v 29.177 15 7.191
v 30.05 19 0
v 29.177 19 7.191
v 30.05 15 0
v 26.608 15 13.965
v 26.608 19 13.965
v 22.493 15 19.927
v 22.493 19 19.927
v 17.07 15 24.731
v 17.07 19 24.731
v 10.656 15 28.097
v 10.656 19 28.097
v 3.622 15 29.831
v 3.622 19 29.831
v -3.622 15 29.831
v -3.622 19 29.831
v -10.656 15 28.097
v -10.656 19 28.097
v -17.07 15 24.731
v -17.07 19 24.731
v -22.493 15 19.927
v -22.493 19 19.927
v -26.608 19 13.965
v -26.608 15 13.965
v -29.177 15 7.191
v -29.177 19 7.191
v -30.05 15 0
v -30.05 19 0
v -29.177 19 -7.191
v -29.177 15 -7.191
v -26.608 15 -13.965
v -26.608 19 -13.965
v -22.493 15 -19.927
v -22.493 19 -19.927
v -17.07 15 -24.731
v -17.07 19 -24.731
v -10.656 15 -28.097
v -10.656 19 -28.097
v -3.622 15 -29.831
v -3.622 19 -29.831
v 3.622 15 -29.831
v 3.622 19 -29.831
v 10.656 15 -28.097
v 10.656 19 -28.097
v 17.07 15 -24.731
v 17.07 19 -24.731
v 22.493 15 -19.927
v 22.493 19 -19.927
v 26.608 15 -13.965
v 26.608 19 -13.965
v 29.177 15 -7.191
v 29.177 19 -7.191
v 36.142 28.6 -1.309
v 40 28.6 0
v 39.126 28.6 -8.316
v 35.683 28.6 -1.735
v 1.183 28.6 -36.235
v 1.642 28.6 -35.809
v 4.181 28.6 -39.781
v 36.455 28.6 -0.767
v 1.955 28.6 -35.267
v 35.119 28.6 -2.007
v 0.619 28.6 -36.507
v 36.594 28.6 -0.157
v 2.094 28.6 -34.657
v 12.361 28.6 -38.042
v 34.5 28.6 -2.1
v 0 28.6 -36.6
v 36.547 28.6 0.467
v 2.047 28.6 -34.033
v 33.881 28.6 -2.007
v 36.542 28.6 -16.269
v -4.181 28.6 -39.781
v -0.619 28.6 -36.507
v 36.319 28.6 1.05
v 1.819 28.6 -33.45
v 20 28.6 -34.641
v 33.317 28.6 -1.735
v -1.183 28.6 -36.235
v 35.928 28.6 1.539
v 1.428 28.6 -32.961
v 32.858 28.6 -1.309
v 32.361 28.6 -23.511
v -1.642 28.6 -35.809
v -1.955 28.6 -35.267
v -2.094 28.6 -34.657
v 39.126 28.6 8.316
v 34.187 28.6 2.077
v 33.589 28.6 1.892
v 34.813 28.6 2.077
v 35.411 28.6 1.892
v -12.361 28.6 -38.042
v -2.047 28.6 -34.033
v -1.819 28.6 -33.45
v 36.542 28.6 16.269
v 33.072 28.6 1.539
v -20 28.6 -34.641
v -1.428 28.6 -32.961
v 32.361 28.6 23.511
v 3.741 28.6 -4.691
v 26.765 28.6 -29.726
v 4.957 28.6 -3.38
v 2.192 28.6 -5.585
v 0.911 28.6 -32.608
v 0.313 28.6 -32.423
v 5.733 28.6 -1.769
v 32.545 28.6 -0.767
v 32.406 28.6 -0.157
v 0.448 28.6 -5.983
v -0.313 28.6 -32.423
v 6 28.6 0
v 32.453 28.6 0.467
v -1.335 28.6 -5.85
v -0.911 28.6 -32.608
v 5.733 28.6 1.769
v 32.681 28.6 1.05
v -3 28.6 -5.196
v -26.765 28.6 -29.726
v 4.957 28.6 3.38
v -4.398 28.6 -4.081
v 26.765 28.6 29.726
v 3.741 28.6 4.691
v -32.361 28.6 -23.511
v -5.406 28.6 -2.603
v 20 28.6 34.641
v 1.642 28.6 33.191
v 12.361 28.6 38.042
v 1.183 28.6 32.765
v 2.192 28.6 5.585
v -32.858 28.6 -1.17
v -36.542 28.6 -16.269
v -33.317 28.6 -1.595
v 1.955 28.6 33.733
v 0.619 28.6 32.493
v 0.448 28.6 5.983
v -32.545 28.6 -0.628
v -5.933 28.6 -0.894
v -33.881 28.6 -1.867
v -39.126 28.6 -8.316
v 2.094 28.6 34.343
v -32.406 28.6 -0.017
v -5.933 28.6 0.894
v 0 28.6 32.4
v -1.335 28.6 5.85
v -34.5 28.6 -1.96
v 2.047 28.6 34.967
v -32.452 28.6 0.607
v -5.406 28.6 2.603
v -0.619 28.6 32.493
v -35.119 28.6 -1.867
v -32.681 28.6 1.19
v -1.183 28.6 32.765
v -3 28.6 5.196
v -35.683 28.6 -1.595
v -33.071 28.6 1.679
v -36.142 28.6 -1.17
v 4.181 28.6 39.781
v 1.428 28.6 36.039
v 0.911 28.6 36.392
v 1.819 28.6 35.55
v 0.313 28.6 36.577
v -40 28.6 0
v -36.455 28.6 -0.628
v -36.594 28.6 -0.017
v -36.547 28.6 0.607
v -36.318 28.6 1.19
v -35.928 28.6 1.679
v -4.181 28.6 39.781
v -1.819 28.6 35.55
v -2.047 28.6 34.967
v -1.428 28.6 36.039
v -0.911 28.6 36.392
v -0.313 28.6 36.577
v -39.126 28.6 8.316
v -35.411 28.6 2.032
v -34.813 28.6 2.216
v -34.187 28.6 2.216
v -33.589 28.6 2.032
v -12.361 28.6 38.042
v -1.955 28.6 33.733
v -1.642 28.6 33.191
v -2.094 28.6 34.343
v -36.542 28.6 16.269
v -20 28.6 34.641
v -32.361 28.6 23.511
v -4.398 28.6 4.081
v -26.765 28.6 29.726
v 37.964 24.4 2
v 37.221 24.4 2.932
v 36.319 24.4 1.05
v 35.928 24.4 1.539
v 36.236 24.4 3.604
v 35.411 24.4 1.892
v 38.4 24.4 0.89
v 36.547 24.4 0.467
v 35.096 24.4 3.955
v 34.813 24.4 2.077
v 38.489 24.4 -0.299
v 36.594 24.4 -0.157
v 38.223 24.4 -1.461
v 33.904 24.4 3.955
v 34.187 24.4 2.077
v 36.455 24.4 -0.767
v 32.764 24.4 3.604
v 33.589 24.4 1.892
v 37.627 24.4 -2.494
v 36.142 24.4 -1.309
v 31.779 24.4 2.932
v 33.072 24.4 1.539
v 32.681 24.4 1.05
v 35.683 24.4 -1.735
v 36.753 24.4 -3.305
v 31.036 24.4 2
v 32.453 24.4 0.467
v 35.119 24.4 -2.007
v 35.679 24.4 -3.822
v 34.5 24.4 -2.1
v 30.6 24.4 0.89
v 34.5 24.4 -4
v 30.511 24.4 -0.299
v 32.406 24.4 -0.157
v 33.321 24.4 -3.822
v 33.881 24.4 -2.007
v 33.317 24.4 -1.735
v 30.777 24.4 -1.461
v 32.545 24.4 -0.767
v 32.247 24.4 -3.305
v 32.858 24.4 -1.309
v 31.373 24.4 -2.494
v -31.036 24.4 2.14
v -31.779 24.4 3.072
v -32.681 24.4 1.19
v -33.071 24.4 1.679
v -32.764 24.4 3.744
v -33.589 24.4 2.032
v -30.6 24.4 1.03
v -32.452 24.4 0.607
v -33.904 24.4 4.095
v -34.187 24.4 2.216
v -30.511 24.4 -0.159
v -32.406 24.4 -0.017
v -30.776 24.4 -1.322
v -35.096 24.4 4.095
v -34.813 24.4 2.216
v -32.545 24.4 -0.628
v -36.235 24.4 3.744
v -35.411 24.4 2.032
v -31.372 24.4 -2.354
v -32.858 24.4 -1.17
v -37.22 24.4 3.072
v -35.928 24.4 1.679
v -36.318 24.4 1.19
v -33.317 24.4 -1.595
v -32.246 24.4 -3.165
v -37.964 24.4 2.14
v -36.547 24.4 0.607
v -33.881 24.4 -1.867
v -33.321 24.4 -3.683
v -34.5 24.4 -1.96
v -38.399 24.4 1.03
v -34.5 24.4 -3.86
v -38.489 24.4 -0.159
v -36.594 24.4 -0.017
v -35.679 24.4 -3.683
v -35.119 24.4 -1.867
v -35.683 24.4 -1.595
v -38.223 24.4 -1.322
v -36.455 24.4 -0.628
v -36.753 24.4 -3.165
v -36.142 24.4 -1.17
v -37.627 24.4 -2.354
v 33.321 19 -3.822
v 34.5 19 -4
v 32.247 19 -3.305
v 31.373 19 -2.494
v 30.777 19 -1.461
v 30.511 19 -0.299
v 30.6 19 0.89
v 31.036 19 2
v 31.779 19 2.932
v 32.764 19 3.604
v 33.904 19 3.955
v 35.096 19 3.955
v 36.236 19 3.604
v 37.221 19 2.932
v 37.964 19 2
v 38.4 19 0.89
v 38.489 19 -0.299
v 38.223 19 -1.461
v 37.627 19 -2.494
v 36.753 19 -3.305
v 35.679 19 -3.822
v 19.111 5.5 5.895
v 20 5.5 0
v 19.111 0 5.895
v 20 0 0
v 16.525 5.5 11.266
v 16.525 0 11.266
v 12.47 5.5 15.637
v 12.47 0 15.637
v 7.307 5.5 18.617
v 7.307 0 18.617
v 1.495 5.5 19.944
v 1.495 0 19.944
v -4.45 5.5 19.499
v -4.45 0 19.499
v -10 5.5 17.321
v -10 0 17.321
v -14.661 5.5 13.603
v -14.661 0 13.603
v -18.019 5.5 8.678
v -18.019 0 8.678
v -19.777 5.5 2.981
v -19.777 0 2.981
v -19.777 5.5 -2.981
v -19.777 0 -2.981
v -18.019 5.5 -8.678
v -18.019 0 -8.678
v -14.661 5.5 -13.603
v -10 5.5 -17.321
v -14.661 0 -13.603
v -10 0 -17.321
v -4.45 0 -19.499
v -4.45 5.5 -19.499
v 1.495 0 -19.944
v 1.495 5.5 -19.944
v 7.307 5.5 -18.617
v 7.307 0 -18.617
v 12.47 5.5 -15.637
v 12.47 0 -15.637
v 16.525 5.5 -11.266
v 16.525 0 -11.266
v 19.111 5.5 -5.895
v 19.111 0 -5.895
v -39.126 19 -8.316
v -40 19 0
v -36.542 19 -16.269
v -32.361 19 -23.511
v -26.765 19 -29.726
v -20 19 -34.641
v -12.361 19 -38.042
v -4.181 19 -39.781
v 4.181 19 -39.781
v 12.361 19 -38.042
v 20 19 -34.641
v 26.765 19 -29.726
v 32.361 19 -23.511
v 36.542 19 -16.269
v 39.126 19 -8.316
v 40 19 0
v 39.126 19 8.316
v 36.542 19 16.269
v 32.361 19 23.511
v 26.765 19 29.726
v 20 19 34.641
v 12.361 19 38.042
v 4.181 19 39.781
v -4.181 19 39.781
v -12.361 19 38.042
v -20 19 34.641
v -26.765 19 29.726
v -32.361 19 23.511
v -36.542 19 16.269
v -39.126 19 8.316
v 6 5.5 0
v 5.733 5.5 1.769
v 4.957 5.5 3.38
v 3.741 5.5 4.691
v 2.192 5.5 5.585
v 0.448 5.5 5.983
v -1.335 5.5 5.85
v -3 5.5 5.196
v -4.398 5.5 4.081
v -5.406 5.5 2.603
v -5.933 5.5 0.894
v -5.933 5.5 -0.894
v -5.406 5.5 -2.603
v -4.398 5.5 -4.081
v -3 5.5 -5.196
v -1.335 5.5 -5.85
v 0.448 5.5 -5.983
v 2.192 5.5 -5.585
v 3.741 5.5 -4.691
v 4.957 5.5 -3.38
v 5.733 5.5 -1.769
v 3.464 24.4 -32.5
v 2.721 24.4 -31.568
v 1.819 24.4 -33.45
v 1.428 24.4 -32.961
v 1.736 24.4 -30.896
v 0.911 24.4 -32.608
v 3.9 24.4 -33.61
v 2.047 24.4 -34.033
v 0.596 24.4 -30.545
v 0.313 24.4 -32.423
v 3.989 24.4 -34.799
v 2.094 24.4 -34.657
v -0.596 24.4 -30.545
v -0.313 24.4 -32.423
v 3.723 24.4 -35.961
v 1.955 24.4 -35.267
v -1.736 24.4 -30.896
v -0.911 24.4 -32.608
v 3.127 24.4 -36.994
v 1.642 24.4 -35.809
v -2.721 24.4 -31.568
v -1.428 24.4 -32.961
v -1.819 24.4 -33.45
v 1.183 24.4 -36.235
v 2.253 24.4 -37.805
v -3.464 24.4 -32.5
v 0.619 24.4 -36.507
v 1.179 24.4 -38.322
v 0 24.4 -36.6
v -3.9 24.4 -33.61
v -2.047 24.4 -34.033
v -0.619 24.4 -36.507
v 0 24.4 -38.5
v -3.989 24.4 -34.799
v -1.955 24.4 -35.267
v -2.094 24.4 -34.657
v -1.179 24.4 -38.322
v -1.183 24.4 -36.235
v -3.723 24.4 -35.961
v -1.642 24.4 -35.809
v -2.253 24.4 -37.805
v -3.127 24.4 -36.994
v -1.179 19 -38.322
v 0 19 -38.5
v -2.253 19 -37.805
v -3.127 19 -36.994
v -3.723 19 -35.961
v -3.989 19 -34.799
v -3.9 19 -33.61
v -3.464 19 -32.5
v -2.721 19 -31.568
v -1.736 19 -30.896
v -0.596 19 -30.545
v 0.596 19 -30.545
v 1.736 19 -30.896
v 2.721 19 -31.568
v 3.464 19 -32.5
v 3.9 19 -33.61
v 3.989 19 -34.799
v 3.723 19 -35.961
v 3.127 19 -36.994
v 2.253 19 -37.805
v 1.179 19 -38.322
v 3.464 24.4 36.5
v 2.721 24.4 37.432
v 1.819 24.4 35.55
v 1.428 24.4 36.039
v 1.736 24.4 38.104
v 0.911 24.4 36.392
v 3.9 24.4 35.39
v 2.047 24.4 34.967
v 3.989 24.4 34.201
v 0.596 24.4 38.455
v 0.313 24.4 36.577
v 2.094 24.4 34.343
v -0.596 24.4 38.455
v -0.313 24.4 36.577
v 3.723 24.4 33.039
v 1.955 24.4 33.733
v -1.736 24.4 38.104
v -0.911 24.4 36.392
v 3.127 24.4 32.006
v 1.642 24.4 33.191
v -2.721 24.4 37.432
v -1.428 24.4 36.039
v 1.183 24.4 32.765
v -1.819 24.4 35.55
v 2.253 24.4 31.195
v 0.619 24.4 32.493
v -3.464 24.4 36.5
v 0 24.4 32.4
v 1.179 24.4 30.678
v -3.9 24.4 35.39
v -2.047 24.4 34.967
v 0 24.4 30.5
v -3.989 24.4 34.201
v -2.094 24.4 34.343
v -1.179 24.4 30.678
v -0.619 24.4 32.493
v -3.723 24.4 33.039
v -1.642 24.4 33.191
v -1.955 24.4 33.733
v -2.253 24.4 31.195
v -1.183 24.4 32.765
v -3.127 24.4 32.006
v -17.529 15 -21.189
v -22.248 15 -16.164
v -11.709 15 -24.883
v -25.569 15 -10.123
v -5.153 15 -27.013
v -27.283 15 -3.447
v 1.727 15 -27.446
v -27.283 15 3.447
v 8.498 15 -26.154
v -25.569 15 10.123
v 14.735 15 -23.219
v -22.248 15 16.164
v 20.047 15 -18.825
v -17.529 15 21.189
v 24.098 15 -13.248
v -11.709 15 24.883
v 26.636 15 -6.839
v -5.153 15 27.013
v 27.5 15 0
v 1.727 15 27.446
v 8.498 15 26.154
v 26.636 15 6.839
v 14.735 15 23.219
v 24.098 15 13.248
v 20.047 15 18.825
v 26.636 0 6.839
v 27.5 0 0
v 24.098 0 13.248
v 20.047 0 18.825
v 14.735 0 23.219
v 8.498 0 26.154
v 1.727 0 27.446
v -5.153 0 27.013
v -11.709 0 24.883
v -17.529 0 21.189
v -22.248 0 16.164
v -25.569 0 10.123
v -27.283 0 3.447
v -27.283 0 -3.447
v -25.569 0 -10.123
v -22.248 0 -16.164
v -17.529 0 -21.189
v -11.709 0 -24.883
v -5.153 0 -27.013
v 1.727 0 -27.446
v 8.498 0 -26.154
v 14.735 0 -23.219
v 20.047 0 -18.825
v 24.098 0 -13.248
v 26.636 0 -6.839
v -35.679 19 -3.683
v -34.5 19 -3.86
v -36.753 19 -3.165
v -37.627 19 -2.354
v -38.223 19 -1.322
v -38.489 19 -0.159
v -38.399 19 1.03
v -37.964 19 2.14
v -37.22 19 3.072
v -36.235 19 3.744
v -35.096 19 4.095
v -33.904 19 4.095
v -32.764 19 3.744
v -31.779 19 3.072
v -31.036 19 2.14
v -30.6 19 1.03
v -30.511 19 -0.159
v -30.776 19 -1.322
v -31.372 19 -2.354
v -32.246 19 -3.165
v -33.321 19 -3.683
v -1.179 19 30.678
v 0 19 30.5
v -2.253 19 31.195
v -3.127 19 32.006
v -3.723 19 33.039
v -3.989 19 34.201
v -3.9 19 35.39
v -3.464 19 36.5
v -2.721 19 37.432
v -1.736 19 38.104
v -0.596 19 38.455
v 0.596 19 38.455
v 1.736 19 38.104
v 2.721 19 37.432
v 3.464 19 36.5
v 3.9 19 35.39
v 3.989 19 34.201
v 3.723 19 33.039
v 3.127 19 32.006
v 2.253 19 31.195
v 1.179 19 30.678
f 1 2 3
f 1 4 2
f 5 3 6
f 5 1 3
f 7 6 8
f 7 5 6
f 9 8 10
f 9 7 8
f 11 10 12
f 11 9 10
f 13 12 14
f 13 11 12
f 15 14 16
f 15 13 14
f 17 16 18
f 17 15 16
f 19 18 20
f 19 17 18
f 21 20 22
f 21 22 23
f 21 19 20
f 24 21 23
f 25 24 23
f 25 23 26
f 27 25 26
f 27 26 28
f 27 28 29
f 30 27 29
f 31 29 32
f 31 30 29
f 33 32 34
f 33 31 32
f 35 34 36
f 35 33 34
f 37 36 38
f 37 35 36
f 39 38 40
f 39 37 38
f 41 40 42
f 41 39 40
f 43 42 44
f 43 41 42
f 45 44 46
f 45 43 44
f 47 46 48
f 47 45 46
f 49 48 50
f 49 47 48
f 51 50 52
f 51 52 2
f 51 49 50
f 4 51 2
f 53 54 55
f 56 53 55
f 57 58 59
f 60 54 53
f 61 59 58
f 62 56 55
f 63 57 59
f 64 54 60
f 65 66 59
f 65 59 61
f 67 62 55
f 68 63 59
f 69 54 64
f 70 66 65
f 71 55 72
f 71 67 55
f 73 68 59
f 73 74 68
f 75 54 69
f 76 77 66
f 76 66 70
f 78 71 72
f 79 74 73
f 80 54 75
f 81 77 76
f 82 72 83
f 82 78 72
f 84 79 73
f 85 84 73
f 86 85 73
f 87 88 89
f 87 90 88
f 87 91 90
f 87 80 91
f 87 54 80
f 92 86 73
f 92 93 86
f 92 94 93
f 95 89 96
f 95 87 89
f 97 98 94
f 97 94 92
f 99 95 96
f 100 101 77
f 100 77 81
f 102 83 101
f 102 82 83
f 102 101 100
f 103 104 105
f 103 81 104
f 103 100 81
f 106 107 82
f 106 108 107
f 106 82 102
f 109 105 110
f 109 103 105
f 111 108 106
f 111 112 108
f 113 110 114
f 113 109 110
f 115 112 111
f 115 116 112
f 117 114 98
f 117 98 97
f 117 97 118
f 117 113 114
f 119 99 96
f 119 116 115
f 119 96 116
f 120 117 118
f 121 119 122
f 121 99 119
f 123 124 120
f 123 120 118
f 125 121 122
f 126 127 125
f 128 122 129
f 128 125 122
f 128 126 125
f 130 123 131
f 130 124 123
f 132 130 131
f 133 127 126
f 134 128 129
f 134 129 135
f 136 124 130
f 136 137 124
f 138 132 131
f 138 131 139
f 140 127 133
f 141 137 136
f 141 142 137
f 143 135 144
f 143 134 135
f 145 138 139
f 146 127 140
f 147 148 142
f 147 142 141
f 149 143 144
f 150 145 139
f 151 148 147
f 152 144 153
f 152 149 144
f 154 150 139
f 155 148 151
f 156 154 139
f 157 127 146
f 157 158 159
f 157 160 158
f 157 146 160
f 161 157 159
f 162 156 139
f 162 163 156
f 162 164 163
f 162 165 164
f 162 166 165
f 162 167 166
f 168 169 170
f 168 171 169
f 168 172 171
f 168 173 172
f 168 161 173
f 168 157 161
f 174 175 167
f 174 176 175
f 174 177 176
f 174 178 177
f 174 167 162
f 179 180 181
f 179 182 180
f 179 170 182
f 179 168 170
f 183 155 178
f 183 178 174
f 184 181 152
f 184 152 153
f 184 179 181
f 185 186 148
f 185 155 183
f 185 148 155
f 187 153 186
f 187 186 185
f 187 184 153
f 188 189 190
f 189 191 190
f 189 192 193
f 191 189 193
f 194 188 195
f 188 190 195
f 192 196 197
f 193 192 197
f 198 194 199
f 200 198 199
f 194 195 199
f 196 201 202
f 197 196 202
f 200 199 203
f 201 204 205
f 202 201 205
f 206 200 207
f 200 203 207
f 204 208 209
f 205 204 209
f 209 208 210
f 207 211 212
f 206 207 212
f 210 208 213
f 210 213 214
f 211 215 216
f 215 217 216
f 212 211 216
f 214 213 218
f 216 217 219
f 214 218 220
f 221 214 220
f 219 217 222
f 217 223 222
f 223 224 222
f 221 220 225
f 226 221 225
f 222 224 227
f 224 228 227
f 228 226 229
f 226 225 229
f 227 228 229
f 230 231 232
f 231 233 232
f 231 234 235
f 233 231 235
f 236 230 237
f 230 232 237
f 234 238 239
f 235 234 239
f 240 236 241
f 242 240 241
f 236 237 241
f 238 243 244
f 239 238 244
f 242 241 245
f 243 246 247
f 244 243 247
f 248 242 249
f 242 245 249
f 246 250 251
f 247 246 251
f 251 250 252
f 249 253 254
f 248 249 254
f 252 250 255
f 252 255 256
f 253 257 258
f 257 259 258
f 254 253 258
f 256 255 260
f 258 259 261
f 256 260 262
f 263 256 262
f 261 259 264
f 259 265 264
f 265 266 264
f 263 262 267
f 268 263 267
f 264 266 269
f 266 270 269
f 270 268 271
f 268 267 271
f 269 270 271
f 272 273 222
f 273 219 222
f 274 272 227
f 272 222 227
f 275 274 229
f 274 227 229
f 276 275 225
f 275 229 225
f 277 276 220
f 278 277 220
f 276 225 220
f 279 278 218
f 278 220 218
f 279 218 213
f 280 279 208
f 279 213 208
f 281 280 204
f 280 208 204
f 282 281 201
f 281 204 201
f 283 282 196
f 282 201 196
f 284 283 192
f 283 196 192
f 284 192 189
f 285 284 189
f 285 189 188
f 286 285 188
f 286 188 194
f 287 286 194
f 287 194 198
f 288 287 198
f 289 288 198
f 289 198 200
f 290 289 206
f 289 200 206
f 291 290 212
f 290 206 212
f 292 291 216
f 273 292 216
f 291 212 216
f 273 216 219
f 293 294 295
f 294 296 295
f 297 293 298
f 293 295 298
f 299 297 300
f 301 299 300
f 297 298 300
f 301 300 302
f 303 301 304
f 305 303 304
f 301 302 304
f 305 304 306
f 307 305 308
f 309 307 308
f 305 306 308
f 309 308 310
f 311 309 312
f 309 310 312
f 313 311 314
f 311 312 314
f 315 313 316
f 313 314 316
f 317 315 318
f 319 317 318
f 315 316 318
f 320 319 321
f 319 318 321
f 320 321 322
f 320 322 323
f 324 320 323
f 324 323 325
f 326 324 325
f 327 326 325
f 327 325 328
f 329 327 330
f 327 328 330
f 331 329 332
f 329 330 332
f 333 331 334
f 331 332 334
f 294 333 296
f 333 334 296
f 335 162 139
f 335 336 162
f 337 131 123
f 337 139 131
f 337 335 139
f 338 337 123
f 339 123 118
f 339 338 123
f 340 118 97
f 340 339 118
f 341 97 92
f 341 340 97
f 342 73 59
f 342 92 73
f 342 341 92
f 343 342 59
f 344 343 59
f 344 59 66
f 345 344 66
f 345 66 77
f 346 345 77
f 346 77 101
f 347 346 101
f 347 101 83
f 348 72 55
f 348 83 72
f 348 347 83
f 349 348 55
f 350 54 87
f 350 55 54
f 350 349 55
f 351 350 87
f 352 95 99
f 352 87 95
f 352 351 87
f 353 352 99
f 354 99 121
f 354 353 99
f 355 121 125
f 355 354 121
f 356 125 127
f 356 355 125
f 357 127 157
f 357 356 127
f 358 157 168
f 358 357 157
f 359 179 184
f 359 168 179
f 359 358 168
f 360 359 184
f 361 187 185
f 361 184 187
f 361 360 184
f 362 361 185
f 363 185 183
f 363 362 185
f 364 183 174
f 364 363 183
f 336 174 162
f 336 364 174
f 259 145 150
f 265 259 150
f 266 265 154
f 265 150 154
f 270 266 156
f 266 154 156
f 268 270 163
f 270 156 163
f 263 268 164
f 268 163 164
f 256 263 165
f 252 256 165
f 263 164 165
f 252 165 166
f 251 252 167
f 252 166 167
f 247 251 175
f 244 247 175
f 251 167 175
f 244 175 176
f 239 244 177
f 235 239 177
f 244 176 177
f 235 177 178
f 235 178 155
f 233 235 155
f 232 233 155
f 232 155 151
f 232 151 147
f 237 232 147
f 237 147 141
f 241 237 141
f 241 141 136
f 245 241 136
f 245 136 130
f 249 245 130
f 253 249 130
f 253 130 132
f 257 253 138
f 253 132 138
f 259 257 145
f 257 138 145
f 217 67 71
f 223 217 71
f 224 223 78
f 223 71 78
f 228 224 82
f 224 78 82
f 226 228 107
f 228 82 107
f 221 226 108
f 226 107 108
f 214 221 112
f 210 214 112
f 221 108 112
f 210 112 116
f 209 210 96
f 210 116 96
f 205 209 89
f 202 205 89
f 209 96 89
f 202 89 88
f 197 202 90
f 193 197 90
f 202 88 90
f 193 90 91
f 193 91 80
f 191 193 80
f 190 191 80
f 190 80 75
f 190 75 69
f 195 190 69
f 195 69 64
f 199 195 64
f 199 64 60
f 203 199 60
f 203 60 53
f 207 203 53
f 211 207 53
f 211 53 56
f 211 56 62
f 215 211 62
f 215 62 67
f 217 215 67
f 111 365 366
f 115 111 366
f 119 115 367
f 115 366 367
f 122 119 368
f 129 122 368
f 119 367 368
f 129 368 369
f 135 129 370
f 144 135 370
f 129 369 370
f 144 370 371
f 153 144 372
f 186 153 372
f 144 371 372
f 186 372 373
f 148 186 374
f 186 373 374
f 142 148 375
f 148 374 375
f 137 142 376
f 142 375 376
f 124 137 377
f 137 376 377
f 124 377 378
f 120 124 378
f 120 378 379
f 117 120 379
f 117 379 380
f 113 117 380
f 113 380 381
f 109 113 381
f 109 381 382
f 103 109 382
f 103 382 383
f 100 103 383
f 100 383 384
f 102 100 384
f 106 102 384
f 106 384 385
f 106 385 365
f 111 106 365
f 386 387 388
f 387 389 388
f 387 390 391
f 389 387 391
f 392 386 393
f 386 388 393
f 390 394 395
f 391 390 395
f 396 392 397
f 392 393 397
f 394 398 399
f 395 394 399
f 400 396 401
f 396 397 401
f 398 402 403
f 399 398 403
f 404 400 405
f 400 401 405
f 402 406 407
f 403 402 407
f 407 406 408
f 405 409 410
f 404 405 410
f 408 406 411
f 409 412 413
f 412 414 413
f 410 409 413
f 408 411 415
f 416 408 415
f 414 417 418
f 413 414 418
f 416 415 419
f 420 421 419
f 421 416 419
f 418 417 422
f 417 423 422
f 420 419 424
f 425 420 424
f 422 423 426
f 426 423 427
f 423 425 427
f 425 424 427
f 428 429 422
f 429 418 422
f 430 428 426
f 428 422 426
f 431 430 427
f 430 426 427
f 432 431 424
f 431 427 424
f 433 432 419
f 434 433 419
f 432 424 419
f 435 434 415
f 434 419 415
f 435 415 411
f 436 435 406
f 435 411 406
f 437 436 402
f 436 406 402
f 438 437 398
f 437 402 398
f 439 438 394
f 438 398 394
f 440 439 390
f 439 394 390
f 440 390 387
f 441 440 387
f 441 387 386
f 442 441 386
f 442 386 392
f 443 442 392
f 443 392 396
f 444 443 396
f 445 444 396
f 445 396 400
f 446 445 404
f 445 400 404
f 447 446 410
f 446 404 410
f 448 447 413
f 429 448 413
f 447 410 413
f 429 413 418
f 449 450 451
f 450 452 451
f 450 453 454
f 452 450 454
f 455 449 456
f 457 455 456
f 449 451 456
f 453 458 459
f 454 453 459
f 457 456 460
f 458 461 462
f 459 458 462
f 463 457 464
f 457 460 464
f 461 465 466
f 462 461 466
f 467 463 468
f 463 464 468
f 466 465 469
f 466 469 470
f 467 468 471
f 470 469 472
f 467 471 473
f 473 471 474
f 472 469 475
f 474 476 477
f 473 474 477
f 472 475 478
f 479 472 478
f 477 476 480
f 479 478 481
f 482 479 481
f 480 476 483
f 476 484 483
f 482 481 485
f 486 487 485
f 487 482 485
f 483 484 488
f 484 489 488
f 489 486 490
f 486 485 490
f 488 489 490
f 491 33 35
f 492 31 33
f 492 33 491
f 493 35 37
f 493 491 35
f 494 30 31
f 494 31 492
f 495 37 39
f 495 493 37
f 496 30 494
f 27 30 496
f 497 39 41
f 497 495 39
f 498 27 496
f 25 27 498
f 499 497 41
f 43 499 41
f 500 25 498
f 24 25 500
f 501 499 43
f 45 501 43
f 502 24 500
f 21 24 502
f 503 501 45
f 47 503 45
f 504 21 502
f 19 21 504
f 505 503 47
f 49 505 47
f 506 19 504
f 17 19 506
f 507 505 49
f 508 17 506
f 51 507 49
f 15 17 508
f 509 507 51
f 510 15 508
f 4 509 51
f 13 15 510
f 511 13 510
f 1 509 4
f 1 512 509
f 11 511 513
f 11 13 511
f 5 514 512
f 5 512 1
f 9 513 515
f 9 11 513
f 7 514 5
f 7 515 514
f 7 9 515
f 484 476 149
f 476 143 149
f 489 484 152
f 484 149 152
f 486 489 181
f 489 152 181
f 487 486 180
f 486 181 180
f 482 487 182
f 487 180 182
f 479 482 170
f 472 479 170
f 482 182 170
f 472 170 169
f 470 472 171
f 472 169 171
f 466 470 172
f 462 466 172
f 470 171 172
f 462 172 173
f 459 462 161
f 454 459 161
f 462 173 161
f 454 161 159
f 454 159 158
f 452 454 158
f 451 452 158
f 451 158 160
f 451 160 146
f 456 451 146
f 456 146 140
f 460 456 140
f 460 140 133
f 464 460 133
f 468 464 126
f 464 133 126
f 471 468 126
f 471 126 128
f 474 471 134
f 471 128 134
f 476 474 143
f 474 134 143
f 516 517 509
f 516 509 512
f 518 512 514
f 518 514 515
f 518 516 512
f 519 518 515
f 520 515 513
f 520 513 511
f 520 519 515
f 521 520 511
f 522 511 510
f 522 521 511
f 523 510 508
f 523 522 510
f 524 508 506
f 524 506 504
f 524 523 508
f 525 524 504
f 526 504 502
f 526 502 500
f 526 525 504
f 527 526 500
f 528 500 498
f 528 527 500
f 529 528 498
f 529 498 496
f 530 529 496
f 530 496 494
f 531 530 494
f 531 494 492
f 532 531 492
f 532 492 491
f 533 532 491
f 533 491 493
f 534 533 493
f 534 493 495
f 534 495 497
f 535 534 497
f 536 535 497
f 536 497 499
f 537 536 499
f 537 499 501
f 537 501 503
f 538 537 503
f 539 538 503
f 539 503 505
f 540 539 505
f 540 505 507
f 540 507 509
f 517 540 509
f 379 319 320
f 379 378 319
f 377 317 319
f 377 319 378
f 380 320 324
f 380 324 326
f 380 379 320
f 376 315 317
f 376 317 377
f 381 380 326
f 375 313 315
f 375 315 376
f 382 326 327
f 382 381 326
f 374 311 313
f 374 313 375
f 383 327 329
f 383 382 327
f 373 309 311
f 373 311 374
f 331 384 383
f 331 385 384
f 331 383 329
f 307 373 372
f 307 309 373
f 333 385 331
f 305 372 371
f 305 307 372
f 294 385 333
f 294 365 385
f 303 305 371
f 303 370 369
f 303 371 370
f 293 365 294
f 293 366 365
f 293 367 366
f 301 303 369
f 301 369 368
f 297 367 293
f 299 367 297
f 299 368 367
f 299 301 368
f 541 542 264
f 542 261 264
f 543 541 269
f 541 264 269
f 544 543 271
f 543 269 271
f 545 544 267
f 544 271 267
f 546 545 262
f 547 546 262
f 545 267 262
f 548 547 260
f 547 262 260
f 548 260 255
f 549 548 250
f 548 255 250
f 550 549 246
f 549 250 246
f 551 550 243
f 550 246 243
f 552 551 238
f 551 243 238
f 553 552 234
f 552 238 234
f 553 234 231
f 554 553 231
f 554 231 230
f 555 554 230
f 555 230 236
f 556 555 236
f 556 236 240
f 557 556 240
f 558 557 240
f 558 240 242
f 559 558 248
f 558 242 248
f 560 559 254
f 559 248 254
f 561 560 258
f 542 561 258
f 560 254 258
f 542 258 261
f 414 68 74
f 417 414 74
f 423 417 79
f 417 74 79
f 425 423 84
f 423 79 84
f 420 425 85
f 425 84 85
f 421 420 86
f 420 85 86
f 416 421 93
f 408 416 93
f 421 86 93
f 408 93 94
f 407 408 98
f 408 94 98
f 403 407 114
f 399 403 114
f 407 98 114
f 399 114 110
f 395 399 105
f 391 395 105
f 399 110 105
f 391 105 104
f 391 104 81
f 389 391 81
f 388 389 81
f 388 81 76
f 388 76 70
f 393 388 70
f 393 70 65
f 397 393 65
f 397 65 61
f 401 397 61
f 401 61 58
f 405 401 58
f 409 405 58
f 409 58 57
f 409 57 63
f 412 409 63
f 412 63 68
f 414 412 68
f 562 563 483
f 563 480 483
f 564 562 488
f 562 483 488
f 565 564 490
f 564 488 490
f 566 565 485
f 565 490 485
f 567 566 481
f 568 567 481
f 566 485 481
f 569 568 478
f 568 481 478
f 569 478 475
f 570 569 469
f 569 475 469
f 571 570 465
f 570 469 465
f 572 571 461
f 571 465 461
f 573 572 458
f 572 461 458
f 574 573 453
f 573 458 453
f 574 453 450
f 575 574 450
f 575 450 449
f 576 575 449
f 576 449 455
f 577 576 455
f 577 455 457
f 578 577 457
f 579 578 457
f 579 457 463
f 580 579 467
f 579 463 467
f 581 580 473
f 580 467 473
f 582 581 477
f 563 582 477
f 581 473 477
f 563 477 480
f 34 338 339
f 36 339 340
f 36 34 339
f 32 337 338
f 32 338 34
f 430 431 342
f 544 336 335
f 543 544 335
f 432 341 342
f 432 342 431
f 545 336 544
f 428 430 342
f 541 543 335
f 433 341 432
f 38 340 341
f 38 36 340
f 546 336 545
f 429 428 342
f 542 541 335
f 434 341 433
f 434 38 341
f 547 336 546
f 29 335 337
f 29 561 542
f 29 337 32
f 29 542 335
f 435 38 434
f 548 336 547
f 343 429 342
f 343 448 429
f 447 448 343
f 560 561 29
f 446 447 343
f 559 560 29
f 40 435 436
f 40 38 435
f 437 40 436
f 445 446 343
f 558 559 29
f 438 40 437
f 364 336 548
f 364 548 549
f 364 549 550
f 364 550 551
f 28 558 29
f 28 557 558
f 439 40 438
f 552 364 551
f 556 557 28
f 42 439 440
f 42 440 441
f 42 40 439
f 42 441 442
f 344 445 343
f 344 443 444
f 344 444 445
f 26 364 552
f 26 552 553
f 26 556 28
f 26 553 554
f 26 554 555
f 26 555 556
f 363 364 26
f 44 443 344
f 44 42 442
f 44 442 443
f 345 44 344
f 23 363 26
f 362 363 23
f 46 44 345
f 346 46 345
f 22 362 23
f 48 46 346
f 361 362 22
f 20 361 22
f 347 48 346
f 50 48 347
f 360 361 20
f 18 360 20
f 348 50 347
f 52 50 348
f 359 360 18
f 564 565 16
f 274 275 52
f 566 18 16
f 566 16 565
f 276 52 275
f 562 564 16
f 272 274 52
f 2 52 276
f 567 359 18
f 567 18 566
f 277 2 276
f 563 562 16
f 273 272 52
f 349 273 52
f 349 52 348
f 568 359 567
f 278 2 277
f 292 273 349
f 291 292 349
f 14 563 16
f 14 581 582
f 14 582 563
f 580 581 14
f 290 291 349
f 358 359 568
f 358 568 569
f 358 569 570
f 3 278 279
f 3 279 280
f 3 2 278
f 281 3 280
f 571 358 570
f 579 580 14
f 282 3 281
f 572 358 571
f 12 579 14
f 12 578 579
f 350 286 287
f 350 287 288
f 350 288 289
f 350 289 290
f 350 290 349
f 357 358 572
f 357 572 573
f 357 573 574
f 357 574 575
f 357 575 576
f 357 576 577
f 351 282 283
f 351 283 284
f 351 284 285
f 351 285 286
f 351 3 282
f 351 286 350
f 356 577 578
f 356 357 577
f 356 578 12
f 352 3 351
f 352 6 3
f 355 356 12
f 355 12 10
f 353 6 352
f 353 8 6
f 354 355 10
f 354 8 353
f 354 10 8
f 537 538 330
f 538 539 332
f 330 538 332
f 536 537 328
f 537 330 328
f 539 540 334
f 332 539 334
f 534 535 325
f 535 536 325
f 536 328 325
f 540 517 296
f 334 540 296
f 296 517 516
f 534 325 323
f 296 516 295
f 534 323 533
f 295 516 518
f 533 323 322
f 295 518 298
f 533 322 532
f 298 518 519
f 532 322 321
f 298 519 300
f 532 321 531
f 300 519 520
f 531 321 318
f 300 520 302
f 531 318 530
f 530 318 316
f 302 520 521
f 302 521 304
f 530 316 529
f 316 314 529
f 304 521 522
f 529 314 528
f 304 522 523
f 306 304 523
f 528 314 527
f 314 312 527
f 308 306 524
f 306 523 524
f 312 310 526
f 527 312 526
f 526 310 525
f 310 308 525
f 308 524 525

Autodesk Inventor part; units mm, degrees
ref_plane "YZ Plane" through (0, 0, 0) normal (1, 0, 0) x (0, 1, 0)
ref_plane "XZ Plane" through (0, 0, 0) normal (0, 1, 0) x (-1, 0, 0)
ref_plane "XY Plane" through (0, 0, 0) normal (0, 0, 1) x (1, 0, 0)
sketch "スケッチ1" plane through (0, 0, 0) normal (0, 1, 0) x (-1, 0, 0)
  circle A0 centre (0, 0) radius 40
  dimension "d0" = 80
extrude "押し出し1" add sketch "スケッチ1" along normal blind 28.6
sketch "スケッチ2" plane through (0, 0, 0) normal (0, -1, 0) x (1, 0, 0)
  circle A0 centre (0, 0) radius 30.05
  circle A1 centre (0, 0) radius 40
  dimension "d3" = 60.1
  dimension "d4" = 80
extrude "押し出し2" cut sketch "スケッチ2" against normal blind 19
sketch "スケッチ3" plane through (0, 0, 0) normal (0, -1, 0) x (1, 0, 0)
  circle A0 centre (0, 0) radius 27.5
  circle A1 centre (0, 0) radius 30.05
  dimension "d7" = 55
extrude "押し出し3" cut sketch "スケッチ3" against normal blind 15
sketch "スケッチ5" plane through (0, 0, 0) normal (0, -1, 0) x (1, 0, 0)
  circle A0 centre (0, 0) radius 20
  dimension "d10" = 40
extrude "押し出し4" cut sketch "スケッチ5" against normal blind 5.5
sketch "スケッチ6" plane through (0, 5.5, 0) normal (0, -1, 0) x (1, 0, 0)
  circle A0 centre (0, 0) radius 6
  dimension "d13" = 12
extrude "押し出し5" cut sketch "スケッチ6" against normal blind 30000
sketch "スケッチ7" plane through (0, 19, 0) normal (0, -1, 0) x (1, 0, 0)
  circle A0 centre (0, 0) radius 34.5
  circle A1 centre (0, 34.5) radius 2
  circle A2 centre (34.5, 0) radius 2
  circle A3 centre (0, -34.5) radius 2
  circle A4 centre (-34.4997, 0.1397) radius 2
  dimension "d60" = 69
  dimension "d61" = 4
  dimension "d62" = 4
  dimension "d63" = 4
  dimension "d64" = 4
extrude "押し出し6" cut sketch "スケッチ7" against normal blind 10 contours A0 A2 | A0 A2 | A1 A0 | A0 A1 | A3 A0 | A0 A3 | A4 A0 | A0 A4
hole "穴1" at (34.5, 19, 0) direction (0, 1, 0) diameter 4.2 depth 10 counterbore diameter 8 counterbore depth 5.4
hole "穴2" at (-34.4997, 19, 0.1397) direction (0, 1, 0) diameter 4.2 depth 10 counterbore diameter 8 counterbore depth 5.4
hole "穴3" at (0, 19, -34.5) direction (0, 1, 0) diameter 4.2 depth 10 counterbore diameter 8 counterbore depth 5.4
hole "穴4" at (0, 19, 34.5) direction (0, 1, 0) diameter 4.2 depth 10 counterbore diameter 8 counterbore depth 5.4
properties part number "GearHead2"
